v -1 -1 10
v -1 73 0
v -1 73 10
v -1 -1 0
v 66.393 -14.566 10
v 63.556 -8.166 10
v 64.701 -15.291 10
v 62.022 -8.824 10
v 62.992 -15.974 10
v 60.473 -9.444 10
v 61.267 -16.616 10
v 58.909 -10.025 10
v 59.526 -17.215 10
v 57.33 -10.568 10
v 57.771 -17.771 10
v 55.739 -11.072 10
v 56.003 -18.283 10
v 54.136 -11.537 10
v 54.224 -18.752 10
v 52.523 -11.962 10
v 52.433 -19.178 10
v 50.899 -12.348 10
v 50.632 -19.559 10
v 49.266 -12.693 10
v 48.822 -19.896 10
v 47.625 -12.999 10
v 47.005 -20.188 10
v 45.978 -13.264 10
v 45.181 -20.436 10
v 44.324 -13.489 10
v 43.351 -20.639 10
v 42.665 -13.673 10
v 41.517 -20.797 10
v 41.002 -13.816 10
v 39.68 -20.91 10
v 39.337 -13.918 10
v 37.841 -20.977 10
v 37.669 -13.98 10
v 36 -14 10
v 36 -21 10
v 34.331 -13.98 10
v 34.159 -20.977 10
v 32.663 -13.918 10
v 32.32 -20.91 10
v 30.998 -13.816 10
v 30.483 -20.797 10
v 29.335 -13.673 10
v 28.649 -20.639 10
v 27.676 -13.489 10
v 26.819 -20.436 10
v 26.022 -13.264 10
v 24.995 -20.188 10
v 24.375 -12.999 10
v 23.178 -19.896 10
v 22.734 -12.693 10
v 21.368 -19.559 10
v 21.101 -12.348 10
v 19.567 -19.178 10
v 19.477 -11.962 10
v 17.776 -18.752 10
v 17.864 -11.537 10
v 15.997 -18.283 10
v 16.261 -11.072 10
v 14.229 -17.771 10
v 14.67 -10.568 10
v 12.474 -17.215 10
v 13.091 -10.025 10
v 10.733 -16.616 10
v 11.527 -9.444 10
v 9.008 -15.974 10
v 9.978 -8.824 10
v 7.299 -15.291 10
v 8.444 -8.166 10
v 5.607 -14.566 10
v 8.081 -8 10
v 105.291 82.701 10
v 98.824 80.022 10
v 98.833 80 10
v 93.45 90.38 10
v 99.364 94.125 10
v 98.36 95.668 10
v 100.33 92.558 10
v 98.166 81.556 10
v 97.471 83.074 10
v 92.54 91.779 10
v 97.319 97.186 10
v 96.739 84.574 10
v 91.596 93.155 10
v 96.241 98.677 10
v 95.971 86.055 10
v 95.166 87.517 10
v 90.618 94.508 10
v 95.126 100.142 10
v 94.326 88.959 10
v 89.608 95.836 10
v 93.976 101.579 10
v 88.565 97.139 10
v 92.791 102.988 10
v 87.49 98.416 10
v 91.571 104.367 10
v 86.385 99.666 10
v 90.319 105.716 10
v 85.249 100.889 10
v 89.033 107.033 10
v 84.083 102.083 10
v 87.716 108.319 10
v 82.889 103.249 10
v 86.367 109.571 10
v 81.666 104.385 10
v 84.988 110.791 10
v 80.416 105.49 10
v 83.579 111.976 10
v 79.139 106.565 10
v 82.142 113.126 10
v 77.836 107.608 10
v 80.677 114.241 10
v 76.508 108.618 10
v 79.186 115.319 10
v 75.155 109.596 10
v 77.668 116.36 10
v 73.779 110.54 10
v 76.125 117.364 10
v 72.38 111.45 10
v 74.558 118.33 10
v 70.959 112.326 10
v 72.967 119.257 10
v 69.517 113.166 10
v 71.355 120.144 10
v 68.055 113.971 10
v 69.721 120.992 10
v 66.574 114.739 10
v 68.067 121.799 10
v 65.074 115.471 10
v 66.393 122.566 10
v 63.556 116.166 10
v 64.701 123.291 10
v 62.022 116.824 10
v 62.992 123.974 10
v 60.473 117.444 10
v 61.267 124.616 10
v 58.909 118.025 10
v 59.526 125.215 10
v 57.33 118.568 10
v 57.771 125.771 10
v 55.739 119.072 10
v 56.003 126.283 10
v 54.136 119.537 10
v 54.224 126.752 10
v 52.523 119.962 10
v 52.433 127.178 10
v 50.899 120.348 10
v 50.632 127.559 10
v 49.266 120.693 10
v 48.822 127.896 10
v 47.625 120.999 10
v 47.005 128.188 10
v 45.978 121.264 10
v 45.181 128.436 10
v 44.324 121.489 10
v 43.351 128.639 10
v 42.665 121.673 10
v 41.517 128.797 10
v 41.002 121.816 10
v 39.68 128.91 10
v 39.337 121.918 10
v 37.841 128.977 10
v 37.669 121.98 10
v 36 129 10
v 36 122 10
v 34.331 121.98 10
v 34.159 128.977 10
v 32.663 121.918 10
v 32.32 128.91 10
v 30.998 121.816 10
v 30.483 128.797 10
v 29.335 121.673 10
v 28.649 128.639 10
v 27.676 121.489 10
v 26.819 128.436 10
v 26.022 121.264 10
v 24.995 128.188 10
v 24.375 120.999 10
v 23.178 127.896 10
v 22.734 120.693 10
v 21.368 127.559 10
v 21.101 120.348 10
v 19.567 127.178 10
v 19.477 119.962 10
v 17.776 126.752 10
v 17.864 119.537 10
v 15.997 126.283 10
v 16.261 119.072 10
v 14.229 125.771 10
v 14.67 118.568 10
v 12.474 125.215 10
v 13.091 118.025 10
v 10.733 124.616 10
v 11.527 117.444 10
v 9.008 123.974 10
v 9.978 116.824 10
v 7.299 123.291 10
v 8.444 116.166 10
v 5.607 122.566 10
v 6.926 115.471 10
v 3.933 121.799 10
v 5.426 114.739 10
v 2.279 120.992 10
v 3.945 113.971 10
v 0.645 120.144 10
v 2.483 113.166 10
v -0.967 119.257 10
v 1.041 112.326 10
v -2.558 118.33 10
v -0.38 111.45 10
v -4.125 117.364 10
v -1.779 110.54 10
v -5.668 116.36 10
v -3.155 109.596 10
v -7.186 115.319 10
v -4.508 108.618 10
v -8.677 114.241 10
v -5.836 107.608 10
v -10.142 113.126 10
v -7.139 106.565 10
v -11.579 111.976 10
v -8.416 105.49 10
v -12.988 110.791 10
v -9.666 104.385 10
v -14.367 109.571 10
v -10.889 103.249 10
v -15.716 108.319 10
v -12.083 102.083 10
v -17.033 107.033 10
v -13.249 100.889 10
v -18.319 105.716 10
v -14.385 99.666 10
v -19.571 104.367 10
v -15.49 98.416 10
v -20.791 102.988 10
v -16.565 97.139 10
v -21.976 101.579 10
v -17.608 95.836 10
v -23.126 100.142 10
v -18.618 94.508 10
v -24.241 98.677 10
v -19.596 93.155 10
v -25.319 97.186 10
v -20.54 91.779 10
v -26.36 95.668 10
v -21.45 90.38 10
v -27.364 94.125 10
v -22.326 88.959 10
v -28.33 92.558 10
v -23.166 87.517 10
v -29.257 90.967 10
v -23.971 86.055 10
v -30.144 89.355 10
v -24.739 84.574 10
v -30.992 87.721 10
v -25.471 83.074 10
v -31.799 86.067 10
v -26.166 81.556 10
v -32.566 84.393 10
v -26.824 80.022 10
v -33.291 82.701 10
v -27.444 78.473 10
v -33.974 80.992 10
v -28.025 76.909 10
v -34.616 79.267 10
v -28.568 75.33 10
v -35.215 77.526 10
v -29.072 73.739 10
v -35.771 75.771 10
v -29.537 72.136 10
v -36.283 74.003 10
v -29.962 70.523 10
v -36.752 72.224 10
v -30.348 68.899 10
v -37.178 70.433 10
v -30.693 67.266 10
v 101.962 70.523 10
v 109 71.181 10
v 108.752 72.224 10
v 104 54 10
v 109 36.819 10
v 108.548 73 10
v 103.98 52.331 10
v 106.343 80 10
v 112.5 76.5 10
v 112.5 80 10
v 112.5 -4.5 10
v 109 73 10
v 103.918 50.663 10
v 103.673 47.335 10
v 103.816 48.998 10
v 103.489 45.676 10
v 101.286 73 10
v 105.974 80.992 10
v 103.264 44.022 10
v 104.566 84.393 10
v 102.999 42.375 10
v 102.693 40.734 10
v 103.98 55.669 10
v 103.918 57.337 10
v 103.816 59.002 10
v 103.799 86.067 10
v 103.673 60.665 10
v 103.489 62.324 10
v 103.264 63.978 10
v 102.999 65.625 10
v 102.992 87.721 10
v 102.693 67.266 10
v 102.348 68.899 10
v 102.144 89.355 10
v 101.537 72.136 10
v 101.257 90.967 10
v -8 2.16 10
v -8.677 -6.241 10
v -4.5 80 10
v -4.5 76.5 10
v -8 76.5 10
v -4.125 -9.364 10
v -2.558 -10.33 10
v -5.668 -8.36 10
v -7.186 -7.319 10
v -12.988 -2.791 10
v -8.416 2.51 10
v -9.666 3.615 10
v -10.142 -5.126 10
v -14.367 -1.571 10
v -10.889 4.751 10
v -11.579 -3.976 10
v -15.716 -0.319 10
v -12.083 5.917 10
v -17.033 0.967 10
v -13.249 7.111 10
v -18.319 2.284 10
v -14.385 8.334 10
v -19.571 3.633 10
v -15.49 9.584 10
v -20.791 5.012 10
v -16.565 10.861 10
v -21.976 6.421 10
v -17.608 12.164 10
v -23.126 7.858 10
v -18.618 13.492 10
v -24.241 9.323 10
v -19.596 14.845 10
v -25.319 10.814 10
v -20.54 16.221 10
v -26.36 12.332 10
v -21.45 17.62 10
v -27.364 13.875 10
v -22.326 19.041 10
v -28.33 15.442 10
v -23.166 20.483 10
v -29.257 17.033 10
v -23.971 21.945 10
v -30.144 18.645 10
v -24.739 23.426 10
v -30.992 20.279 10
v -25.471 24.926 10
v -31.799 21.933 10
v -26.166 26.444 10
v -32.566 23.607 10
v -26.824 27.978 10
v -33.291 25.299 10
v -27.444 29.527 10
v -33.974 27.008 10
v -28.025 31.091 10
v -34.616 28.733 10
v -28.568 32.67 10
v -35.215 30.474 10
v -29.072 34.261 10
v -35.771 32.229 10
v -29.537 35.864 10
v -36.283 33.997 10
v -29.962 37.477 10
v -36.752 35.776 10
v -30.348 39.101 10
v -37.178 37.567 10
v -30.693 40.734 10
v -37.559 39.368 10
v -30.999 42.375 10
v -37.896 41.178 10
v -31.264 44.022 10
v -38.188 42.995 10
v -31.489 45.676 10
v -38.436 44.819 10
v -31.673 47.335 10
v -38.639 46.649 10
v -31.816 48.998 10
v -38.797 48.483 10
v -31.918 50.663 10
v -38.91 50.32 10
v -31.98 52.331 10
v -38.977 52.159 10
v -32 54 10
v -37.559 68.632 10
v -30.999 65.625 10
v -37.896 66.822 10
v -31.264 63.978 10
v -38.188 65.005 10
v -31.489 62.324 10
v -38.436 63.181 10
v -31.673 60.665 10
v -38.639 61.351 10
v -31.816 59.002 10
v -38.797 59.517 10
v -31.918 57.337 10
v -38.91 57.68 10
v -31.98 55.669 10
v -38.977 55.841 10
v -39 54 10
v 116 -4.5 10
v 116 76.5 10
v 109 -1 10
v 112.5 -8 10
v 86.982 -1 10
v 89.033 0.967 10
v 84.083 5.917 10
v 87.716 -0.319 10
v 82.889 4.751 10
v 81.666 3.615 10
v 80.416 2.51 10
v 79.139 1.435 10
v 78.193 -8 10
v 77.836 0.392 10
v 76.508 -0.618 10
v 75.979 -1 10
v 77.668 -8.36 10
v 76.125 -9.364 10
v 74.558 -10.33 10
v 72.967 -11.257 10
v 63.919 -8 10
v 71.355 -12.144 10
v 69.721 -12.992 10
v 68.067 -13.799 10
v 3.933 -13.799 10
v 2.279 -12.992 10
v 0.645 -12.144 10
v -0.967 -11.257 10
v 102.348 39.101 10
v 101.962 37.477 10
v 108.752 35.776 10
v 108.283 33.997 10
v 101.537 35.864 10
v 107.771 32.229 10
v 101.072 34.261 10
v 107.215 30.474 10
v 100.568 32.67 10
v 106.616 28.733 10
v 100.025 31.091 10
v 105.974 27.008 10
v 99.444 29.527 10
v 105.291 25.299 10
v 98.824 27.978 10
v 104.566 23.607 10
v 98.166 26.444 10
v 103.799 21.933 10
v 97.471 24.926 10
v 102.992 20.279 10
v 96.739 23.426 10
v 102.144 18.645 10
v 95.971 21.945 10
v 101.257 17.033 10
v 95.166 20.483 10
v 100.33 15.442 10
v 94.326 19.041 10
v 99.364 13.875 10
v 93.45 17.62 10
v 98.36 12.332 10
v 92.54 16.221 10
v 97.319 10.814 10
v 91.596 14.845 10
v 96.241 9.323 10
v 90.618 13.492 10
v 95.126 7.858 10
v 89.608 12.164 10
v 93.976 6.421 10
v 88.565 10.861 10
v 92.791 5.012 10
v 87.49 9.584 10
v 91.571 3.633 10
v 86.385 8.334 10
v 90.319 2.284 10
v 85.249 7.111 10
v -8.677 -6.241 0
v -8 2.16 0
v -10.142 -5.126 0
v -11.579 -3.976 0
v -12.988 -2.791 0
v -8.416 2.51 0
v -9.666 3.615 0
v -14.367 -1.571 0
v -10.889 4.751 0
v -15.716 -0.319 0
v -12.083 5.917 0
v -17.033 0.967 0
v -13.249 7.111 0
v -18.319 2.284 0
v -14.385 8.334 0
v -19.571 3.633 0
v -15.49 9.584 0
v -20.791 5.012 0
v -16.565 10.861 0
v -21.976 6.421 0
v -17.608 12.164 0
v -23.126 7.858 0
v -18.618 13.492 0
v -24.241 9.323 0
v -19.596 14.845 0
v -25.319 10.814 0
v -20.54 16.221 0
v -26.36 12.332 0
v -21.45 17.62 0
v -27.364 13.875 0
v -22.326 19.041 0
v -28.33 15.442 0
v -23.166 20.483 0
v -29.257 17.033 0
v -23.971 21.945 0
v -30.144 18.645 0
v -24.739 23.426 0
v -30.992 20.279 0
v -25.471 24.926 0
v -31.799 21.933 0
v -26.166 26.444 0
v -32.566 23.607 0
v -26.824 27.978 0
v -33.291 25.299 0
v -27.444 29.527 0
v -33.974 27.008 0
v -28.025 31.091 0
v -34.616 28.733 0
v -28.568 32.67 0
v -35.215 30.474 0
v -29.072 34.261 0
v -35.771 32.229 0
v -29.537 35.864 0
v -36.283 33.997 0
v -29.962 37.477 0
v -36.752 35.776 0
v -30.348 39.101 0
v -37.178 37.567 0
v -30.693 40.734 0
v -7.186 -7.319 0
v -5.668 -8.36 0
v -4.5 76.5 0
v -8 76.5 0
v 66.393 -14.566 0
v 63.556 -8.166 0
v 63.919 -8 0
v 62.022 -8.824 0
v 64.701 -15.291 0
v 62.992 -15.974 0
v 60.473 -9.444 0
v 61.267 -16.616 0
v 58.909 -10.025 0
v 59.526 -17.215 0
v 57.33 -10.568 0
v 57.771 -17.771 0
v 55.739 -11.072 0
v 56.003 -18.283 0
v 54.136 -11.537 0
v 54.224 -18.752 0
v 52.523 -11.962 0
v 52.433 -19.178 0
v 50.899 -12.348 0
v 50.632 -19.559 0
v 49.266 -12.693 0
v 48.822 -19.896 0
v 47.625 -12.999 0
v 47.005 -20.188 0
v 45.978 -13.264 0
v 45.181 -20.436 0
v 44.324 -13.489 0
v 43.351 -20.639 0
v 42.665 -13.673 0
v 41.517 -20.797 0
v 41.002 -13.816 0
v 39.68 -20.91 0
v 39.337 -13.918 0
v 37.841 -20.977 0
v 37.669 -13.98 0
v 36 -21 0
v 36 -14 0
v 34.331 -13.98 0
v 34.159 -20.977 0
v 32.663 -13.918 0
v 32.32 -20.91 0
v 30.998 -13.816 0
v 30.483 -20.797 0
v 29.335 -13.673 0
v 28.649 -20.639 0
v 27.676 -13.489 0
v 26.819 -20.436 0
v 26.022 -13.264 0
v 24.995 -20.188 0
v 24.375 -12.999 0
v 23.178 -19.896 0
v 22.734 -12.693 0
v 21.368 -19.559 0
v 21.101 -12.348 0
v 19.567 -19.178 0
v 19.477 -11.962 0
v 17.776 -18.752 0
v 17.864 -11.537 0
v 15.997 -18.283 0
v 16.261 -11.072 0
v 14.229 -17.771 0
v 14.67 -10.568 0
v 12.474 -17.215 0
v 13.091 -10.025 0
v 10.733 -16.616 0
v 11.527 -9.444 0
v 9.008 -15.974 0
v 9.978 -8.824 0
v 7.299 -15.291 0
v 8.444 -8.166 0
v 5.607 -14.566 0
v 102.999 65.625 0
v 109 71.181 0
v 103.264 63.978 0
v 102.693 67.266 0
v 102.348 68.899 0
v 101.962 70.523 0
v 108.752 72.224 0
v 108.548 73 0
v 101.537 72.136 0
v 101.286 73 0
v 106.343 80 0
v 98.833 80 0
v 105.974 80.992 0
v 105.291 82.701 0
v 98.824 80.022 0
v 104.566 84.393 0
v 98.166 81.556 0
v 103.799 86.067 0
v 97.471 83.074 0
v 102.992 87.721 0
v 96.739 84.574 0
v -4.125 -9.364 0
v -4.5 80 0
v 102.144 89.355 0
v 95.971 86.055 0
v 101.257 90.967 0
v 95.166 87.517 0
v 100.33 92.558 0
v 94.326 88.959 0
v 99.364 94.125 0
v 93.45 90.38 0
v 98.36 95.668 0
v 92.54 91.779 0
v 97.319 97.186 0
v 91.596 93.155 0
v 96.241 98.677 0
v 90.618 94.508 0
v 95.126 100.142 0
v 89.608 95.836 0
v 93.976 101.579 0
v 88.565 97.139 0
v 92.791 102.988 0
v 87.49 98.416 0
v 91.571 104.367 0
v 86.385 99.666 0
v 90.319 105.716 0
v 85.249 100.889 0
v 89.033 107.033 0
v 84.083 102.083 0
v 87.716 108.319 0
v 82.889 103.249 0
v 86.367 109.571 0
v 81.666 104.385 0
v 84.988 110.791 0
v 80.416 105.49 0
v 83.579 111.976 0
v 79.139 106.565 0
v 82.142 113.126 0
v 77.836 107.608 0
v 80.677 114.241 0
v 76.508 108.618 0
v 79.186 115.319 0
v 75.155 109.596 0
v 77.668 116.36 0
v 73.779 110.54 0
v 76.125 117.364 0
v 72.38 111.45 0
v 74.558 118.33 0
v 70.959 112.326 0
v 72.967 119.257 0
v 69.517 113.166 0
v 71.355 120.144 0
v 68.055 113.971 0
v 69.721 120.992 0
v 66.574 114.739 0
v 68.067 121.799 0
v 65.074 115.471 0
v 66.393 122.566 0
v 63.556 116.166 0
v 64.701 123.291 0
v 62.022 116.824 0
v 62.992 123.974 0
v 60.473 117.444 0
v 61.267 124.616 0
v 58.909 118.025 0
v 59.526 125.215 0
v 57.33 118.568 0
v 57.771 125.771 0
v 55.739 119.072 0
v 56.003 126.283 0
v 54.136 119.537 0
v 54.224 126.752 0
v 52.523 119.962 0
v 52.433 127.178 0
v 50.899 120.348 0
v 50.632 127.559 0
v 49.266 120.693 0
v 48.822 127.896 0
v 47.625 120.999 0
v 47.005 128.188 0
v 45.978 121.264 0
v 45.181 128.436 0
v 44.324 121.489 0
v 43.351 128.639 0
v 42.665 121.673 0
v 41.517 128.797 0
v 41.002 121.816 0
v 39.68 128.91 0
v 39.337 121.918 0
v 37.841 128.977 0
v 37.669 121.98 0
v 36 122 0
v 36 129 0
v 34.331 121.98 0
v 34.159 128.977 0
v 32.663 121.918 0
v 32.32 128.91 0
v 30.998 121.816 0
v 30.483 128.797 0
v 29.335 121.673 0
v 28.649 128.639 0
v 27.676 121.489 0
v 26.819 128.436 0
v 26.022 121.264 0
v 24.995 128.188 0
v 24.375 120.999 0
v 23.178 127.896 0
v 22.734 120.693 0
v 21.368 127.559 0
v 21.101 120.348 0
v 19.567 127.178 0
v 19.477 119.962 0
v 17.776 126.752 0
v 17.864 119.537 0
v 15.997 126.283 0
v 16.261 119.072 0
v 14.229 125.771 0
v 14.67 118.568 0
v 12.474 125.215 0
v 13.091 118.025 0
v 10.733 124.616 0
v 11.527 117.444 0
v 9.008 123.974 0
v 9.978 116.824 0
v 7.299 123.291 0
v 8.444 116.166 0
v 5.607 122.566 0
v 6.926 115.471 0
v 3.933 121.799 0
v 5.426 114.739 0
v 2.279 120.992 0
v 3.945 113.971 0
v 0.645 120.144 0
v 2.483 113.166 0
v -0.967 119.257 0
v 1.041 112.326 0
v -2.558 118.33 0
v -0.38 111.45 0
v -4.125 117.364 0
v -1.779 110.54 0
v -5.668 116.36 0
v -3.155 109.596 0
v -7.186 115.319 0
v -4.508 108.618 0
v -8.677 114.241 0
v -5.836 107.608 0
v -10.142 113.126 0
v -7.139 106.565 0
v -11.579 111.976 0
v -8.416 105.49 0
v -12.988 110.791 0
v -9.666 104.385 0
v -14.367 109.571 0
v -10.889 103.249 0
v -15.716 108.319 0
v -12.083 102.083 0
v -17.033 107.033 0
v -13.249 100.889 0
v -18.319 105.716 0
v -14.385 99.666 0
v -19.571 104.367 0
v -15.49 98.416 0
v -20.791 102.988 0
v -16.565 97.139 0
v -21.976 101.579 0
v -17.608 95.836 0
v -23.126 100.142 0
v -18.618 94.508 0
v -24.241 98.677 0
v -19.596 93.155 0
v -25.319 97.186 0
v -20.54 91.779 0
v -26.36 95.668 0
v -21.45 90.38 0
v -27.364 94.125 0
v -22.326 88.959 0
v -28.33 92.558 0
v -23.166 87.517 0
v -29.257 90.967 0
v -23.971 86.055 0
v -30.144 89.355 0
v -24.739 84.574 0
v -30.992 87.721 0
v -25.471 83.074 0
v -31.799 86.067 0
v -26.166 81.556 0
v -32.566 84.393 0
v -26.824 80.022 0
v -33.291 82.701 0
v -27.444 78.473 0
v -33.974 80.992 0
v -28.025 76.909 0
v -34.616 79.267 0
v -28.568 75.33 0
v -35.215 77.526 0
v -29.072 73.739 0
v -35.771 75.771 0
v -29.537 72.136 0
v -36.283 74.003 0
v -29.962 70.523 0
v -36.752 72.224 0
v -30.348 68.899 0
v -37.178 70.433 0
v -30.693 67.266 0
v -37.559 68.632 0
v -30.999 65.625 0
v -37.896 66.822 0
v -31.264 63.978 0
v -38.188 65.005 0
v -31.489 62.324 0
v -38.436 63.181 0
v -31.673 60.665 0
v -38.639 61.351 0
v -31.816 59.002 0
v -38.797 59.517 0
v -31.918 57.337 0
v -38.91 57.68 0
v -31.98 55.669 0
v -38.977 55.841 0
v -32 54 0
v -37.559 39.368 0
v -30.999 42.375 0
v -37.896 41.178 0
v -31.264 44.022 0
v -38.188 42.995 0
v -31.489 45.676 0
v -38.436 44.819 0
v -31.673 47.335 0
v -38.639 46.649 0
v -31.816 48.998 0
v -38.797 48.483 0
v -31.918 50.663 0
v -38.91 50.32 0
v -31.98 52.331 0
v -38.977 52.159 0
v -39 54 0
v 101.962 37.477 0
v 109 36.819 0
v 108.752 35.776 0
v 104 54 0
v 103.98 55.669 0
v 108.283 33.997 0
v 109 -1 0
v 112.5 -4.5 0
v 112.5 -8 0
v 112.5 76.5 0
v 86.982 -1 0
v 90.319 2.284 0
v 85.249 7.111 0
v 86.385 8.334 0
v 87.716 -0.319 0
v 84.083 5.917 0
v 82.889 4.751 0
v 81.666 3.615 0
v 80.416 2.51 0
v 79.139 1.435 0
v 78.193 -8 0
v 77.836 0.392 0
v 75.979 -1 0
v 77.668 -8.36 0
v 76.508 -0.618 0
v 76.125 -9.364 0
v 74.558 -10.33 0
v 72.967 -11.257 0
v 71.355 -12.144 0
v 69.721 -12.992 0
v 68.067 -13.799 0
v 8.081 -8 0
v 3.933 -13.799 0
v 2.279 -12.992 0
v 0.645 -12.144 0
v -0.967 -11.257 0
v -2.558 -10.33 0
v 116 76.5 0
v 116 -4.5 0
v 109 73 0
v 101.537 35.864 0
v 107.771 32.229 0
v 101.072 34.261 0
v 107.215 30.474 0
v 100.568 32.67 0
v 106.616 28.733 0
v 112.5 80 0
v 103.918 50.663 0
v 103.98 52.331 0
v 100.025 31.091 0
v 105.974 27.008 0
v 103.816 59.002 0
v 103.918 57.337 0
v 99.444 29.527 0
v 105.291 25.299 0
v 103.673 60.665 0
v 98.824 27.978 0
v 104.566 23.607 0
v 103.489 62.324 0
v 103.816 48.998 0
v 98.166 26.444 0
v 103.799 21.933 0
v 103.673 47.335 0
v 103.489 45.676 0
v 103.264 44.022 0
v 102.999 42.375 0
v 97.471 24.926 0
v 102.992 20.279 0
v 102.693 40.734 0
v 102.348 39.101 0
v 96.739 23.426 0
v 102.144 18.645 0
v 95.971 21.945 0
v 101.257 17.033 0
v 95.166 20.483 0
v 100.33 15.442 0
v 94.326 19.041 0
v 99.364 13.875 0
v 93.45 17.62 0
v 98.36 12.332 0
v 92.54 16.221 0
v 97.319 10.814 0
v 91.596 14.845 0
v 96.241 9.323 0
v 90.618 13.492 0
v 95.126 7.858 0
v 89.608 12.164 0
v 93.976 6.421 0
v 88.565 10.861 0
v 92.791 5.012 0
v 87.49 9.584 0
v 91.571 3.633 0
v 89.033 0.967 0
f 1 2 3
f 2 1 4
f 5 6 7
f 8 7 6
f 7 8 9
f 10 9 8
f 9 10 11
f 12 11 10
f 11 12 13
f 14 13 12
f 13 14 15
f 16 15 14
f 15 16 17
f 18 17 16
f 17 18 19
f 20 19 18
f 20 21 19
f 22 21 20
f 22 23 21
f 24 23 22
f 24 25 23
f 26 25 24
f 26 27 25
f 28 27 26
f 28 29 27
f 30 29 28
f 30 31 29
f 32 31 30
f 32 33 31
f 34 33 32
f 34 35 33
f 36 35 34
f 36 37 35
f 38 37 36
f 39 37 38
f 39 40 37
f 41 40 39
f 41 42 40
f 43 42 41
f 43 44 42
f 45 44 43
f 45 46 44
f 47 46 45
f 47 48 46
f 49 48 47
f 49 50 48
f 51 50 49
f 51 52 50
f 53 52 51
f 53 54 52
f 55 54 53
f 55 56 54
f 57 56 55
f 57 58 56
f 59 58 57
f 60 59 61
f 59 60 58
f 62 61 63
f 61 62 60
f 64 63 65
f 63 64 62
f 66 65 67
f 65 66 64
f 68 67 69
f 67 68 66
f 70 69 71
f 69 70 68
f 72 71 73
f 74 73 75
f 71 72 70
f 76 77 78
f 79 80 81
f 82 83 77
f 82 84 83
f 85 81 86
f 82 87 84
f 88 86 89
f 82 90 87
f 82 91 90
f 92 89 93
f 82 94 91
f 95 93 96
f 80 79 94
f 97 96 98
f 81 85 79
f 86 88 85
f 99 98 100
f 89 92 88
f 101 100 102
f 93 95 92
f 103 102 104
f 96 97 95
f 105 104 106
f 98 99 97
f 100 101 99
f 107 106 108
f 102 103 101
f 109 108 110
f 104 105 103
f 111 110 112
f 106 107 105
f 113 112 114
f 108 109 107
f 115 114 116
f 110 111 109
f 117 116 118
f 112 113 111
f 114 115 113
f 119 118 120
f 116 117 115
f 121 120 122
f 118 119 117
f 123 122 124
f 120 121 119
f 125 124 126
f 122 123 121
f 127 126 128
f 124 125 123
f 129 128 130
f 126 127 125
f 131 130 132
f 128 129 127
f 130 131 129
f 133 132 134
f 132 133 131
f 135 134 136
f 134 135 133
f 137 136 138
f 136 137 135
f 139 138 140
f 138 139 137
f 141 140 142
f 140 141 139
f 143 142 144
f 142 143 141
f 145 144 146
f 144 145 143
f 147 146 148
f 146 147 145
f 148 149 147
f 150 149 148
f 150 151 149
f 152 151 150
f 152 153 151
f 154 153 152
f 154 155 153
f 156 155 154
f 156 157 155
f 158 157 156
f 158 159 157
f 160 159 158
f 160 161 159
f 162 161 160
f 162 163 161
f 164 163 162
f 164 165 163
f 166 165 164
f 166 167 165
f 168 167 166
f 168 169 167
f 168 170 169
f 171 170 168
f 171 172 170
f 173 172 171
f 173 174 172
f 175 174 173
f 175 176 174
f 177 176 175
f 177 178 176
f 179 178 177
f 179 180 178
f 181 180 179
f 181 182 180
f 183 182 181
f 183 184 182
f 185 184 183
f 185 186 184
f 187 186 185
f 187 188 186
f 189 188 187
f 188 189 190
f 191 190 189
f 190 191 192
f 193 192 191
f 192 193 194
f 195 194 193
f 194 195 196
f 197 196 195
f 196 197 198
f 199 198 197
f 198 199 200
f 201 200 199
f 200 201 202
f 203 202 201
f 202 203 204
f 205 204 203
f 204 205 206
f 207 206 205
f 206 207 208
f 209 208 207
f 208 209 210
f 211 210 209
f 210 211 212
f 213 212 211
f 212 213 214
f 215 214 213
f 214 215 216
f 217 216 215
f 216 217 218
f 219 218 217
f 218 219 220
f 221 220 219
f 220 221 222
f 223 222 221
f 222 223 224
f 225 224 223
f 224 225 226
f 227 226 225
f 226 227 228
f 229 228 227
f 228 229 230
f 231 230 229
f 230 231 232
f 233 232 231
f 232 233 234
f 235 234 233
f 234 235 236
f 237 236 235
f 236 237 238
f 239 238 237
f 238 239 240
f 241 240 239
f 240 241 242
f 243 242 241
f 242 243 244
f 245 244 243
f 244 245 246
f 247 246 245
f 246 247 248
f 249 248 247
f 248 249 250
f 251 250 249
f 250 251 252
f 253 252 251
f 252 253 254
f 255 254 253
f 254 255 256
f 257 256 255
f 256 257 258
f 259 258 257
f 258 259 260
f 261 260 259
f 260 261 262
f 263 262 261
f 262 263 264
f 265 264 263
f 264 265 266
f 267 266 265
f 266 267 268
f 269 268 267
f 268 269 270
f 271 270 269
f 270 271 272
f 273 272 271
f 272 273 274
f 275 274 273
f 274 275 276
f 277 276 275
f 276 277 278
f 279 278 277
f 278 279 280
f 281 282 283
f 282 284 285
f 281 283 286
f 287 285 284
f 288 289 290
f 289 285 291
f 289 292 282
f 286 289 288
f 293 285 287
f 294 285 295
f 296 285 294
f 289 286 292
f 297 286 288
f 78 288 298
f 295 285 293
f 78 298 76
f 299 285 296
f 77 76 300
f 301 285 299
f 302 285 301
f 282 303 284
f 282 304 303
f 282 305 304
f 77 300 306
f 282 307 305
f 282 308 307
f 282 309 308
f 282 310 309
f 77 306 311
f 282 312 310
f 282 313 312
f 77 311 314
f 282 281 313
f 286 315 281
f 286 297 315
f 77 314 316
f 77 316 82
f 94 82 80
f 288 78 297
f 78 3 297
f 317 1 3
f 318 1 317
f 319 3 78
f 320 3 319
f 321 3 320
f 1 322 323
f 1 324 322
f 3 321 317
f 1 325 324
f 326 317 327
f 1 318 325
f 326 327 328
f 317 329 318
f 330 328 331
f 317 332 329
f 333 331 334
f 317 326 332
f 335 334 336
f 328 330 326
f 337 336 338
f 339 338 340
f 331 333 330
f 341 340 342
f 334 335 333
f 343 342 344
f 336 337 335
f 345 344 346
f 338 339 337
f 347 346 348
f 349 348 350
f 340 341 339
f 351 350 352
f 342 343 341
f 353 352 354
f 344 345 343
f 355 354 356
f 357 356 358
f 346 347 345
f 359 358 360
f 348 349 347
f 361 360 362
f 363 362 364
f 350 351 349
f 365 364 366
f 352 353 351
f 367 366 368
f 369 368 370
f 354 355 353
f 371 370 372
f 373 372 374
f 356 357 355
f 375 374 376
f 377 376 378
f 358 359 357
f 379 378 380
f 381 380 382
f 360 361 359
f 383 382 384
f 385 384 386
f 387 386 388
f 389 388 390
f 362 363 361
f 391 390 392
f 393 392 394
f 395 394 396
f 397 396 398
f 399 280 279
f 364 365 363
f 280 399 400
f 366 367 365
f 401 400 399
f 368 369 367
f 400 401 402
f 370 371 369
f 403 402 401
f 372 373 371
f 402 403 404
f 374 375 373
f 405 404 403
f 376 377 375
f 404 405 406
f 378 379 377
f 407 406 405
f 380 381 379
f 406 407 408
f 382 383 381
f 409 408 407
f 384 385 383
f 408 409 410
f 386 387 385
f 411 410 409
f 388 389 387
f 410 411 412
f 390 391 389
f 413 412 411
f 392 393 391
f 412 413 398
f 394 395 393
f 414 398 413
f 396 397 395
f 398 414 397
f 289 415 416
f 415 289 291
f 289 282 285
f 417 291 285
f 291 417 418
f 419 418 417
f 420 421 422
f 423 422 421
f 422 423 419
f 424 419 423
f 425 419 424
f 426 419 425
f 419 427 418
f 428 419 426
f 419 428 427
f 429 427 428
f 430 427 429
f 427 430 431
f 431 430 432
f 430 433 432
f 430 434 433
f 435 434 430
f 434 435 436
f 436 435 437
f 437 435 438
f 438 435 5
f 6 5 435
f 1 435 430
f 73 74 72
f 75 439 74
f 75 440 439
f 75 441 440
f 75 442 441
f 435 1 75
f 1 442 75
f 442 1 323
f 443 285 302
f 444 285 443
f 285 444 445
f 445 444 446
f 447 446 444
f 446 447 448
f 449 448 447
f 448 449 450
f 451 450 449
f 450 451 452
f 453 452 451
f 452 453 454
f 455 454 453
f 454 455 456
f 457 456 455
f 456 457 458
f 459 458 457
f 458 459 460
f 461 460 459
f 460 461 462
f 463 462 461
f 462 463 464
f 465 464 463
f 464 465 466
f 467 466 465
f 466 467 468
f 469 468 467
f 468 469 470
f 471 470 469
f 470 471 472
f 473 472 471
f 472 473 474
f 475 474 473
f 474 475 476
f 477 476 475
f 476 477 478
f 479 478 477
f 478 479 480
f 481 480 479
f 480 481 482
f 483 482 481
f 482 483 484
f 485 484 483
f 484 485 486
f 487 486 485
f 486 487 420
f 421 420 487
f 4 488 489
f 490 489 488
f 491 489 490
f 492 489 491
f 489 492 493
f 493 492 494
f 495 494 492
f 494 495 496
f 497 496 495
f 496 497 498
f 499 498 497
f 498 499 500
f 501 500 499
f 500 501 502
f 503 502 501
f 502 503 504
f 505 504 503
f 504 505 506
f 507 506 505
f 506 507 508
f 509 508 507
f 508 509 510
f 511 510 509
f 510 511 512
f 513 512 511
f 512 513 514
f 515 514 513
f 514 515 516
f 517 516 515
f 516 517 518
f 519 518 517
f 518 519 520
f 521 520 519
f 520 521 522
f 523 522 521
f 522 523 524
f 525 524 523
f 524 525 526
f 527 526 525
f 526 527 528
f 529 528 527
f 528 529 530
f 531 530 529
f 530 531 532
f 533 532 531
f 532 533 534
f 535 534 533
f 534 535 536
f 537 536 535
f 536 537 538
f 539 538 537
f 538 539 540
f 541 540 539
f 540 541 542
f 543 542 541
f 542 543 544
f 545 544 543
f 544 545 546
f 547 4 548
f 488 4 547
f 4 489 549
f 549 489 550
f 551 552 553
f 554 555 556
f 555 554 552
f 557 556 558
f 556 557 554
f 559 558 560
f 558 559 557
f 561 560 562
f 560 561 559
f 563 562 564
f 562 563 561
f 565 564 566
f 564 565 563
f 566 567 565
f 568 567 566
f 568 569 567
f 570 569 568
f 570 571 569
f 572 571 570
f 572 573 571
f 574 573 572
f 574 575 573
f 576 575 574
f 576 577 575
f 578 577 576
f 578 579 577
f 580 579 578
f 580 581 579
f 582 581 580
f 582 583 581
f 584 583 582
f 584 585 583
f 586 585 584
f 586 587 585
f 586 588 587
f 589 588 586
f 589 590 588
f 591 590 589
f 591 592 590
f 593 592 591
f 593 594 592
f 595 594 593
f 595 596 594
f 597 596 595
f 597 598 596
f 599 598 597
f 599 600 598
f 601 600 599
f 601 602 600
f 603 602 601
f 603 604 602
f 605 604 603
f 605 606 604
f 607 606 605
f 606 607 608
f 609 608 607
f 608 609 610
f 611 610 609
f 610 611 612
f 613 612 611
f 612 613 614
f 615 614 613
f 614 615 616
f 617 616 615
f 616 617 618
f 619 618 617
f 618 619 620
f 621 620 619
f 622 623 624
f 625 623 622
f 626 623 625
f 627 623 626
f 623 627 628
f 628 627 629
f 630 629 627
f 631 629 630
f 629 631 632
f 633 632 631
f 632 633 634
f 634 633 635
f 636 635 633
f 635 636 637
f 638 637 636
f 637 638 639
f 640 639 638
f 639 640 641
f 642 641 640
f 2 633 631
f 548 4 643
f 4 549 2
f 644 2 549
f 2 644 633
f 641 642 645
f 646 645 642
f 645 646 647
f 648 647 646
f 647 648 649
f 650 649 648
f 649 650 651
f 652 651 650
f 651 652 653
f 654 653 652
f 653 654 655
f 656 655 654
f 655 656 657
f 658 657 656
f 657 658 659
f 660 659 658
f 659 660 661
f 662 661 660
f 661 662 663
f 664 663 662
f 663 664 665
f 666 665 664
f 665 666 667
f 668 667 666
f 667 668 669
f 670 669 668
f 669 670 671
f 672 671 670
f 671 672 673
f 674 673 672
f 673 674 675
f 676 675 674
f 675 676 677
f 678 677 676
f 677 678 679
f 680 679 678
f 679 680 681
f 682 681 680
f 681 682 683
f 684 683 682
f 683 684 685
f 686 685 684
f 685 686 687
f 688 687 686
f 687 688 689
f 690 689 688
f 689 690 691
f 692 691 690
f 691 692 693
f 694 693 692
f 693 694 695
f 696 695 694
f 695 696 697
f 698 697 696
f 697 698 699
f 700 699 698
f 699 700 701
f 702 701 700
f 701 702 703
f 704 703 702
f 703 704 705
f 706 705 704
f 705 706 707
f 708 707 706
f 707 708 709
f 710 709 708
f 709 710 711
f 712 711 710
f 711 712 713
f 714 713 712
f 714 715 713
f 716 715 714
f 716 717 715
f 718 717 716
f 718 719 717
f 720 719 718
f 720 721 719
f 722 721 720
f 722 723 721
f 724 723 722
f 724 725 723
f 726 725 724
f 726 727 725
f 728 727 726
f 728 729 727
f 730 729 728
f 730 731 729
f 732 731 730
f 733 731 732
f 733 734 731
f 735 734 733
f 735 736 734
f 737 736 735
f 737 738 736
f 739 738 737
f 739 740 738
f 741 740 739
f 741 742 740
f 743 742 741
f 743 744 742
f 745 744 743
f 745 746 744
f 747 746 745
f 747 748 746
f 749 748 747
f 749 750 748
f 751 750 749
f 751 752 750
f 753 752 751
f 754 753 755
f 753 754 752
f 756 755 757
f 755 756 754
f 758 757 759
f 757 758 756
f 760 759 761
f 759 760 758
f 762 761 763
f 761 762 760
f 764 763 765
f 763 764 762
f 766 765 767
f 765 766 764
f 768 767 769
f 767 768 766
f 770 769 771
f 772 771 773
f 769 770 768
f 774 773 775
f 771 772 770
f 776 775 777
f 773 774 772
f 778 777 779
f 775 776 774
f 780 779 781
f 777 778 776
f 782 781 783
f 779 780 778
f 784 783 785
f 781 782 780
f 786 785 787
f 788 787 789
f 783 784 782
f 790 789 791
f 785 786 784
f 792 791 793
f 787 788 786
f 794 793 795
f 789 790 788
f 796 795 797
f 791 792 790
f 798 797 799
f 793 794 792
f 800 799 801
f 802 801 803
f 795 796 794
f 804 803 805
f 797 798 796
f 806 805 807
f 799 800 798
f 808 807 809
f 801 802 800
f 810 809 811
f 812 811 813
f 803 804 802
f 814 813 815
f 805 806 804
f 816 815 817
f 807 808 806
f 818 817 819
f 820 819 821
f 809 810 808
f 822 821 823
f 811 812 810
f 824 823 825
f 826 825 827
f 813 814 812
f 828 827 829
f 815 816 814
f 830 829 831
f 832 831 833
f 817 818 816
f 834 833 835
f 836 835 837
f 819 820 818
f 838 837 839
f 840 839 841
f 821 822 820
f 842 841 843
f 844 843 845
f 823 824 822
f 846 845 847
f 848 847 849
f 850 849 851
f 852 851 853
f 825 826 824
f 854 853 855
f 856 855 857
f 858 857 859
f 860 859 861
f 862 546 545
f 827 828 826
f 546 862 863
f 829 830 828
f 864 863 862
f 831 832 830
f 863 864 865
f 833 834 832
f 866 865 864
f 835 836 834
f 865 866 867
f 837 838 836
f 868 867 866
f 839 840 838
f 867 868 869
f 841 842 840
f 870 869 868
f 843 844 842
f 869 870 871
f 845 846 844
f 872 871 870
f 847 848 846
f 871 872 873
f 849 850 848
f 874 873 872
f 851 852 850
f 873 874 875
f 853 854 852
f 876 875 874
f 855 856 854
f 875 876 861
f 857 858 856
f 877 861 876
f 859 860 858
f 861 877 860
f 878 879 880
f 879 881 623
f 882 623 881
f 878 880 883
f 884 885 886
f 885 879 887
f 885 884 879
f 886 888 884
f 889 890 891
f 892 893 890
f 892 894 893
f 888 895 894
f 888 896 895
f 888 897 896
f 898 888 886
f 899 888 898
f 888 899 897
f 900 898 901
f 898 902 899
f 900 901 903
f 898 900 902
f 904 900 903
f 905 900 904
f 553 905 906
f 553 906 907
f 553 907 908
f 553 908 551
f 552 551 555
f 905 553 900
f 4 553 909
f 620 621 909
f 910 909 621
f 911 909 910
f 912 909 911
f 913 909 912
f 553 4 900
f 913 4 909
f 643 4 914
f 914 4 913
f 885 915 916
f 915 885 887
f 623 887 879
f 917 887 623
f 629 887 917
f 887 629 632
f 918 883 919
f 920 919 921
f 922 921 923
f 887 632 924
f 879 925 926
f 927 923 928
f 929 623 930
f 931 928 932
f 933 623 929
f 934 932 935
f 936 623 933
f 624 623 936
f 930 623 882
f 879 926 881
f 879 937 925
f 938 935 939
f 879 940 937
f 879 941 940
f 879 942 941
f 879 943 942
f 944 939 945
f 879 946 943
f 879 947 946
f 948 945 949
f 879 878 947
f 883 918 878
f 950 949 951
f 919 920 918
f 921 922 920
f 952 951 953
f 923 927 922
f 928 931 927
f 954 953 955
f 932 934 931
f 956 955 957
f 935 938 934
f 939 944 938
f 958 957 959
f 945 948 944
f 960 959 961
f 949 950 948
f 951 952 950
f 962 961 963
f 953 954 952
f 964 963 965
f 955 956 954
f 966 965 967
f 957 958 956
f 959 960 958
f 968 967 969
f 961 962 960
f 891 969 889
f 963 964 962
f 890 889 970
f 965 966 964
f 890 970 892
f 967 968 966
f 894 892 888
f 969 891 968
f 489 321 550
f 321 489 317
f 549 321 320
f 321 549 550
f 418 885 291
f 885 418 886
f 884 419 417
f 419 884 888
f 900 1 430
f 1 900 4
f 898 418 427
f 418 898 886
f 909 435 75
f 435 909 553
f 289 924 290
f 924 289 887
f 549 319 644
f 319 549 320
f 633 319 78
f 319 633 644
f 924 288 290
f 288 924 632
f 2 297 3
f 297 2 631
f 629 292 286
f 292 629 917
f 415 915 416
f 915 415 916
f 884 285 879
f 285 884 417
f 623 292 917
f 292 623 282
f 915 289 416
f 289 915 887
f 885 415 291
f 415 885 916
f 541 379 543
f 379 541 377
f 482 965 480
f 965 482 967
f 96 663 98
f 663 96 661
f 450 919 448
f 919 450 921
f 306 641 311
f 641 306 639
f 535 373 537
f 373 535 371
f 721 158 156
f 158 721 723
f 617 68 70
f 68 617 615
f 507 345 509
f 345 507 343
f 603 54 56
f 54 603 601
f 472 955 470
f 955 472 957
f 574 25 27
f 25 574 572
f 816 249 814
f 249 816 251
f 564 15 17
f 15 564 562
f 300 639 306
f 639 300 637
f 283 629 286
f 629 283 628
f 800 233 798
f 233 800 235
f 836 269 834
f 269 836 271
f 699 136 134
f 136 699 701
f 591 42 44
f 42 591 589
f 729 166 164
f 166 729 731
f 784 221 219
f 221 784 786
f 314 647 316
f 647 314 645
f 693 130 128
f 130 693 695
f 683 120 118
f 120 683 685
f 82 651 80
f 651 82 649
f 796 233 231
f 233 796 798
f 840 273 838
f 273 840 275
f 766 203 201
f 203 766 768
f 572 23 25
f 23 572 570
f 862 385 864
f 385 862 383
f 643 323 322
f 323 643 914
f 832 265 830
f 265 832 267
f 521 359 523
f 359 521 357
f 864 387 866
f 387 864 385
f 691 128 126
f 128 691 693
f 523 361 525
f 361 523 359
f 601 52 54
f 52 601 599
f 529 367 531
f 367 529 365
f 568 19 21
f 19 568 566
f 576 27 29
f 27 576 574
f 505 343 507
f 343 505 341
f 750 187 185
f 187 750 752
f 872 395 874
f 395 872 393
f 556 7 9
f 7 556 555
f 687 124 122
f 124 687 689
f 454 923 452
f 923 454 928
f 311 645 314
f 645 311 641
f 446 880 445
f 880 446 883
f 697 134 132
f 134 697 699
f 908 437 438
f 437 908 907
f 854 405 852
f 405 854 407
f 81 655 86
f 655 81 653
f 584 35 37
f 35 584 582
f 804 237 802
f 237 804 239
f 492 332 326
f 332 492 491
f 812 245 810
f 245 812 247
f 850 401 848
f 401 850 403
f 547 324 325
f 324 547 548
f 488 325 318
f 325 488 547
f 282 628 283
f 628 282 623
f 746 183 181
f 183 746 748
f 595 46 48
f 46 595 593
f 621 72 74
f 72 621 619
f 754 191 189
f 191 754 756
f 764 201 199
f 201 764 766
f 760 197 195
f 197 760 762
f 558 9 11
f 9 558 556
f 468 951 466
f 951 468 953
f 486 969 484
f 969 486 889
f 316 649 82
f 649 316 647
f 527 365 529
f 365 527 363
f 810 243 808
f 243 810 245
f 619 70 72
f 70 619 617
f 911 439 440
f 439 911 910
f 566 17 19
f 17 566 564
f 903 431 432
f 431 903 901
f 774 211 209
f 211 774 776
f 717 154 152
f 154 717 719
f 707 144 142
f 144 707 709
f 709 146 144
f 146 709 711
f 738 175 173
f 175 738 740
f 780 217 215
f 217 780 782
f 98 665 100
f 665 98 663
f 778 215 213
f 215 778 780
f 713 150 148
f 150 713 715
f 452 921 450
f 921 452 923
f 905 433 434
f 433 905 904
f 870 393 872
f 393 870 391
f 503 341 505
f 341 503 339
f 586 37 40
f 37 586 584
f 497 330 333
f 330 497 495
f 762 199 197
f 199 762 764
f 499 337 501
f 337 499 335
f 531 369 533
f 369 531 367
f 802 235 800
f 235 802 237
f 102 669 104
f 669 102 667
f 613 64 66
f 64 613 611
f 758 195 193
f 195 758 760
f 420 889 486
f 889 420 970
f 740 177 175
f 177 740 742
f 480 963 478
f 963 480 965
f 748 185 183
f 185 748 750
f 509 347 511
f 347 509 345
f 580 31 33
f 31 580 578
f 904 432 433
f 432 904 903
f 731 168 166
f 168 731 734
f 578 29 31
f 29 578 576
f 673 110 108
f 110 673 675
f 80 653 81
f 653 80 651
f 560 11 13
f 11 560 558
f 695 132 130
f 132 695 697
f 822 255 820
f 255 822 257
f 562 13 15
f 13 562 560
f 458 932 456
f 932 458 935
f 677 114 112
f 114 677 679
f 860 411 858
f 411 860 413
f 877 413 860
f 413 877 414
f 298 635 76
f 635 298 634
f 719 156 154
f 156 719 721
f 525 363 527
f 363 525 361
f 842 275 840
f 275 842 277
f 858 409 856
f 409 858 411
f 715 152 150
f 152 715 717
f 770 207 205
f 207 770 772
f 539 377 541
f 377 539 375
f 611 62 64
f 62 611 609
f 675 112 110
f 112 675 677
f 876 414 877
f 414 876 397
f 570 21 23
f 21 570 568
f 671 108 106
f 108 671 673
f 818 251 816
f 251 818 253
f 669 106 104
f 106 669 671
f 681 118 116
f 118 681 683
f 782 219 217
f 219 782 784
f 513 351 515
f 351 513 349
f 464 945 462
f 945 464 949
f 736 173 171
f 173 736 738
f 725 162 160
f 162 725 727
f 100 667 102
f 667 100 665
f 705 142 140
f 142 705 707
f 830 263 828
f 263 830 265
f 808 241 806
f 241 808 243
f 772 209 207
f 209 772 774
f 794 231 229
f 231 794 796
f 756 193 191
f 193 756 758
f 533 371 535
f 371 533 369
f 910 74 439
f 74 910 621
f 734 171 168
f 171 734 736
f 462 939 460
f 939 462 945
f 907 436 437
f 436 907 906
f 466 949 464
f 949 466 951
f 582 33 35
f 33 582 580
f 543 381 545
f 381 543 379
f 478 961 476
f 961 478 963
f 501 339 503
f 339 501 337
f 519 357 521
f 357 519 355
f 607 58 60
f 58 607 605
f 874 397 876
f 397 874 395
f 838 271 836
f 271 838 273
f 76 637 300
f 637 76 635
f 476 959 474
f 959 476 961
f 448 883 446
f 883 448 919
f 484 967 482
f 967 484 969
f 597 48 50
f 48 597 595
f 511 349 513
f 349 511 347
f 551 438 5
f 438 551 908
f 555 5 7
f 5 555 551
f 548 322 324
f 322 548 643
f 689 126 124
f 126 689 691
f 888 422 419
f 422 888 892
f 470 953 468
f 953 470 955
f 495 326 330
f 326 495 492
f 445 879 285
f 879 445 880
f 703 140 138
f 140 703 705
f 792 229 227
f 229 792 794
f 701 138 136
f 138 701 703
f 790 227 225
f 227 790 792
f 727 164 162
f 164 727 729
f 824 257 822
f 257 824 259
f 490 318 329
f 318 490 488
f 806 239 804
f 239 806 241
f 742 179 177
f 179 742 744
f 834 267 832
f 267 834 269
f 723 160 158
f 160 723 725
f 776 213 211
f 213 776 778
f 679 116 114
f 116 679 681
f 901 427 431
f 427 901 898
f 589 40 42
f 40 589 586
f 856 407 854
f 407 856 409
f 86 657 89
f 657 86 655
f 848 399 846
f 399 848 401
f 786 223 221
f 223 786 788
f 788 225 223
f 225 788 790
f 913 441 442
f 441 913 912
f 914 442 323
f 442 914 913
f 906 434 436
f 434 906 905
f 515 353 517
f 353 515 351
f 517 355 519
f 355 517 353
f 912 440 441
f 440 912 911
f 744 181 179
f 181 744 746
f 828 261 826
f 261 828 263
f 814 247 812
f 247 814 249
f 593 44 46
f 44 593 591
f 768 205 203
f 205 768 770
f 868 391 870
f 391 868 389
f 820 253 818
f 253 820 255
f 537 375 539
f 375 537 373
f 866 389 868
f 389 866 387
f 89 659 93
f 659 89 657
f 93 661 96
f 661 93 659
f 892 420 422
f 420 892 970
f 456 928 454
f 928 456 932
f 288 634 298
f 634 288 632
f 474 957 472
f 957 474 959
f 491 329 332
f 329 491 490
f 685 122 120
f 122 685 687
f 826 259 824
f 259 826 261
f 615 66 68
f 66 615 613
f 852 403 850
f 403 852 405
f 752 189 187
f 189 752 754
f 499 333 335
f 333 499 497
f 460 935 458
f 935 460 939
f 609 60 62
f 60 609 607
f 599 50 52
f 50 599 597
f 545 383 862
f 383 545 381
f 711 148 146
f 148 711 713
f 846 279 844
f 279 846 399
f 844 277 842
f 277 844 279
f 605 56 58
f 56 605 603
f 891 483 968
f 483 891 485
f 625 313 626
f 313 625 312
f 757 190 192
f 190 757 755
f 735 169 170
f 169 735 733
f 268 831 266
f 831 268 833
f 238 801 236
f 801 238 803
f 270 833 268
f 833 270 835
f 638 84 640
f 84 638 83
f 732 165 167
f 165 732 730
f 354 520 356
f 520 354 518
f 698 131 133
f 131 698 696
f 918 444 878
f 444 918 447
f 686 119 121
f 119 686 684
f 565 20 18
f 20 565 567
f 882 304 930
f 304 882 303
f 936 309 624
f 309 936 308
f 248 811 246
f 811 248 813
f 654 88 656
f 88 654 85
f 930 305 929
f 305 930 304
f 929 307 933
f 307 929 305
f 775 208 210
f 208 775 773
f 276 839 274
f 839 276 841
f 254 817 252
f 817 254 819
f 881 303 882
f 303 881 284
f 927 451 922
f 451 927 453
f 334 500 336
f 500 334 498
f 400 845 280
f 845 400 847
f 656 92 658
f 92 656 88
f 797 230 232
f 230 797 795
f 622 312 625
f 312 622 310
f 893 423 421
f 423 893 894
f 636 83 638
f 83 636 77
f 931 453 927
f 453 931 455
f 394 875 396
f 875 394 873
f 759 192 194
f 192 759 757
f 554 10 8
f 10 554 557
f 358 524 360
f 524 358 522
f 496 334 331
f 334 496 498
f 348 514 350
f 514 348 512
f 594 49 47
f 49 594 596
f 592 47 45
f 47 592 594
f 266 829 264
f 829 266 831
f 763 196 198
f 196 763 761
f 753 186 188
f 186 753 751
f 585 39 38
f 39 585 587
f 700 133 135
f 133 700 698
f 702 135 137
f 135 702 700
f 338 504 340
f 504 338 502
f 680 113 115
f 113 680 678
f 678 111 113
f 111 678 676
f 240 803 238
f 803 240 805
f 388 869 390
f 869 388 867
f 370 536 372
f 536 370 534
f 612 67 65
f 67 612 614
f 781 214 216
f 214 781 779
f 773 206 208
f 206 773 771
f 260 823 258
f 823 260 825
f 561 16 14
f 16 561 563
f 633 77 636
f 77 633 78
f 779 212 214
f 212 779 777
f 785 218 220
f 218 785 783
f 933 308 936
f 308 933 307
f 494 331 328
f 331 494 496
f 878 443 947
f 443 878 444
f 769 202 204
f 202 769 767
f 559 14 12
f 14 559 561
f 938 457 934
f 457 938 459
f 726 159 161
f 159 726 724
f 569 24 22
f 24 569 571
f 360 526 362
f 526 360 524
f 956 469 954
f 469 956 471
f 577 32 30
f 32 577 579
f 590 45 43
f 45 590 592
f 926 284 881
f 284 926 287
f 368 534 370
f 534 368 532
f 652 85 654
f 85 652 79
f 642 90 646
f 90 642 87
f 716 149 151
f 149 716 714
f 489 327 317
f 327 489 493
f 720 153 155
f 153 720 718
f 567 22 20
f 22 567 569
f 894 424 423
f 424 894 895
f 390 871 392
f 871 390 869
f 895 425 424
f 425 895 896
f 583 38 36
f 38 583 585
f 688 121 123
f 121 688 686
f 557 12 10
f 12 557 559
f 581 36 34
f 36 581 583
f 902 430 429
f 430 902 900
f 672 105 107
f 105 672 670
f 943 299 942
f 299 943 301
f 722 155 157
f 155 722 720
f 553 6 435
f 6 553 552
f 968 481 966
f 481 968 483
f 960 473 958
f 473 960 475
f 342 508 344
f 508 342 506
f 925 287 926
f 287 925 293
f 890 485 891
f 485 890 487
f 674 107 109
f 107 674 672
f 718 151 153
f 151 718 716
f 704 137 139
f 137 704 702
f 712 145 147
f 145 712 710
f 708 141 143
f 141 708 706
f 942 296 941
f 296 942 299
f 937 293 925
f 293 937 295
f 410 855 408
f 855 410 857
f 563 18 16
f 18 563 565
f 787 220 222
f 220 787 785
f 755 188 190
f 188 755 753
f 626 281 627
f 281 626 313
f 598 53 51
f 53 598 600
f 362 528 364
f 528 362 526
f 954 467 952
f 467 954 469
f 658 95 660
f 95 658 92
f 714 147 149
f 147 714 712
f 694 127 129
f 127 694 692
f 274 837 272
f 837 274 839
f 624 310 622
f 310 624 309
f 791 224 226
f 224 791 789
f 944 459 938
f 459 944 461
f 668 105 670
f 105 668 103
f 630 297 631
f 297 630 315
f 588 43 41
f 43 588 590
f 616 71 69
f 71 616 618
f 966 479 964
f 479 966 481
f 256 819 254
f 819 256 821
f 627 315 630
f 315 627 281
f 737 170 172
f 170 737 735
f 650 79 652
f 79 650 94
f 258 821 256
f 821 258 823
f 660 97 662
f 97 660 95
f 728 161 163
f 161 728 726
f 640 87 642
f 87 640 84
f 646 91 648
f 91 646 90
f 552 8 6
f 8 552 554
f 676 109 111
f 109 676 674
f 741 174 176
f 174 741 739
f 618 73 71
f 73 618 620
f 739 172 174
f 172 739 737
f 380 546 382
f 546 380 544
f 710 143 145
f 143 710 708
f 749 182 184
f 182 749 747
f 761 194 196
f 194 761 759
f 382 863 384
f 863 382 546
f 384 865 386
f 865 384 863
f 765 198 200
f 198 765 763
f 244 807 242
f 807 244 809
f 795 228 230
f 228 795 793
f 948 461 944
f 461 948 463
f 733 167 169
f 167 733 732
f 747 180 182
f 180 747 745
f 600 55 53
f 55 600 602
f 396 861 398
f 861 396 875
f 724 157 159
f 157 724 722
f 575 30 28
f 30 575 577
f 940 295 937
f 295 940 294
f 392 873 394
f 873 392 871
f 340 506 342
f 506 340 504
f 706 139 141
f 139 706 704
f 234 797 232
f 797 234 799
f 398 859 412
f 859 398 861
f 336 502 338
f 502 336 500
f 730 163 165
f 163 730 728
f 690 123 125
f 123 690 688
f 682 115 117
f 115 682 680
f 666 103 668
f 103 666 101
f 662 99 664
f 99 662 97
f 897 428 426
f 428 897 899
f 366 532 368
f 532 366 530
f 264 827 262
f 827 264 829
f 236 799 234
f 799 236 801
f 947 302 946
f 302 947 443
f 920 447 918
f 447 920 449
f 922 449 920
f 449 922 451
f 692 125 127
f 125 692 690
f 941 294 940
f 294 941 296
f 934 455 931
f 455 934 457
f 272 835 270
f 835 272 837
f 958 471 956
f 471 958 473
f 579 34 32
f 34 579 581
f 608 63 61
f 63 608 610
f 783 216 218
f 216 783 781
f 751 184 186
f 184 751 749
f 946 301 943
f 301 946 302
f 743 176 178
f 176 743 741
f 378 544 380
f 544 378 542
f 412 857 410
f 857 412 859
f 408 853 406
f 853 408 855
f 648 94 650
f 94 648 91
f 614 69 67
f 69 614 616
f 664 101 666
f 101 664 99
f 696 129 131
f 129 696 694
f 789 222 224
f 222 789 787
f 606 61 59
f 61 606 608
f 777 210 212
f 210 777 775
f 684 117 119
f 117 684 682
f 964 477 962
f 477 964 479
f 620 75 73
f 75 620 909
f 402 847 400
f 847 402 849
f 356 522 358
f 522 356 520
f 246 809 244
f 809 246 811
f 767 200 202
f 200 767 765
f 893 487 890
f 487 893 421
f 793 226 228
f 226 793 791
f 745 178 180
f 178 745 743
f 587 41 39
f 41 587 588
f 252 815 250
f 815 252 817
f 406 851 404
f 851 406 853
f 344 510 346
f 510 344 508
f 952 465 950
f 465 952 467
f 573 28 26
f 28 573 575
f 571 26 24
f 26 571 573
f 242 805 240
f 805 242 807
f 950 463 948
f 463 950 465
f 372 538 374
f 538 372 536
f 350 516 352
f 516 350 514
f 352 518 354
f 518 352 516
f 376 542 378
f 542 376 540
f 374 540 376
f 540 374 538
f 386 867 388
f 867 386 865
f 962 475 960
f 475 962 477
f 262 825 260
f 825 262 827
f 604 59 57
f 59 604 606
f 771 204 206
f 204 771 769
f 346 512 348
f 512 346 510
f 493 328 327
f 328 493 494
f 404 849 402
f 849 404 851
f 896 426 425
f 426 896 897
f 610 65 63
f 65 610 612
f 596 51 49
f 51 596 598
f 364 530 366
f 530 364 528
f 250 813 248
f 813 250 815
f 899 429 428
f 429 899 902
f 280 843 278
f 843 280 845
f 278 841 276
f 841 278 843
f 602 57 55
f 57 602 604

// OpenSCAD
// Generated by SolidPython 1.1.3 on 2026-06-23 12:54:22


union() {
	union() {
		translate(v = [-4.5000000000, 36.0000000000, 5.0000000000]) {
			cube(center = true, size = [7, 81, 10]);
		}
		translate(v = [54.0000000000, -4.5000000000, 5.0000000000]) {
			cube(center = true, size = [117, 7, 10]);
		}
		translate(v = [0, 81]) {
			translate(v = [54.0000000000, -4.5000000000, 5.0000000000]) {
				cube(center = true, size = [117, 7, 10]);
			}
		}
		translate(v = [117, 0]) {
			translate(v = [-4.5000000000, 36.0000000000, 5.0000000000]) {
				cube(center = true, size = [7, 81, 10]);
			}
		}
	}
	translate(v = [36.0000000000, 54.0000000000]) {
		difference() {
			cylinder($fn = 256, h = 10, r = 75.0000000000);
			cylinder($fn = 256, h = 10, r = 68.0000000000);
		}
	}
}
/***********************************************
*********      SolidPython code:      **********
************************************************

"""SCAD file export functions.

This module provides functions for exporting OpenSCAD geometries to .scad files.
"""

from typing import Dict, Optional
from pathlib import Path
import solid

from .config import ExportConfiguration, FileNamingConfig


def export_scad(
    geometry: solid.OpenSCADObject, output_path: Path, header: Optional[str] = None
) -> Path:
    """Export geometry to SCAD file.

    Parameters
    ----------
    geometry : solid.OpenSCADObject
        Geometry to export.
    output_path : Path
        Output file path.
    header : str, optional
        Header comment to add to SCAD file.

    Returns
    -------
    Path
        Path to created SCAD file.

    Raises
    ------
    IOError
        If file cannot be written.

    Examples
    --------
    >>> from pathlib import Path
    >>> import solid
    >>>
    >>> geometry = solid.cube([10, 10, 10])
    >>> output_path = Path('output/device.scad')
    >>> export_scad(geometry, output_path)
    """
    # Ensure parent directory exists
    output_path.parent.mkdir(parents=True, exist_ok=True)

    # Render to file
    try:
        solid.scad_render_to_file(geometry, str(output_path))
    except Exception as e:
        raise IOError(f"Failed to write SCAD file to {output_path}: {e}")

    _normalize_scad_file(output_path)

    # Add header if provided
    if header:
        _add_header_to_scad(output_path, header)
        _normalize_scad_file(output_path)

    return output_path


def _normalize_scad_file(scad_path: Path) -> None:
    """Strip trailing whitespace from generated SCAD text."""
    content = scad_path.read_text()
    normalized = "\n".join(line.rstrip() for line in content.splitlines()) + "\n"
    if normalized != content:
        scad_path.write_text(normalized)


def export_multiple_scad(
    geometries: Dict[str, solid.OpenSCADObject],
    config: ExportConfiguration,
    naming_config: Optional[FileNamingConfig] = None,
) -> Dict[str, Path]:
    """Export multiple geometries to SCAD files.

    Parameters
    ----------
    geometries : dict
        Dictionary mapping prefixes to geometries.
        Keys are used as filename prefixes.
    config : ExportConfiguration
        Export configuration.
    naming_config : FileNamingConfig, optional
        File naming configuration.

    Returns
    -------
    dict
        Dictionary mapping prefixes to output paths.

    Examples
    --------
    >>> geometries = {
    ...     'wells': wells_geometry,
    ...     'channels': channels_geometry,
    ...     'device': device_geometry
    ... }
    >>> config = ExportConfiguration(output_directory=Path('output'))
    >>> paths = export_multiple_scad(geometries, config)
    """
    output_paths = {}

    for prefix, geometry in geometries.items():
        # Create naming config for this geometry
        if naming_config:
            file_config = FileNamingConfig(
                prefix=prefix,
                version=naming_config.version,
                grid_size=naming_config.grid_size,
                suffix=naming_config.suffix,
            )
        else:
            file_config = FileNamingConfig(prefix=prefix)

        # Generate filename
        filename = file_config.generate_filename("scad")
        output_path = config.get_output_path(filename)

        # Export
        export_scad(geometry, output_path)
        output_paths[prefix] = output_path

    return output_paths


def _add_header_to_scad(scad_path: Path, header: str):
    """Add header comment to existing SCAD file.

    Parameters
    ----------
    scad_path : Path
        Path to SCAD file.
    header : str
        Header text to add.
    """
    # Read existing content
    with open(scad_path, "r") as f:
        content = f.read()

    # Prepend header
    header_comment = f"// {header}\n\n"
    with open(scad_path, "w") as f:
        f.write(header_comment + content)


def generate_scad_header(
    device_name: str, version: Optional[str] = None, description: Optional[str] = None
) -> str:
    """Generate SCAD file header comment.

    Parameters
    ----------
    device_name : str
        Device name.
    version : str, optional
        Version string.
    description : str, optional
        Device description.

    Returns
    -------
    str
        Header comment text.

    Examples
    --------
    >>> header = generate_scad_header(
    ...     'Two Compartment Device',
    ...     version='v1',
    ...     description='96-well format with microchannels'
    ... )
    """
    lines = []
    lines.append("=" * 60)
    lines.append(f"Device: {device_name}")

    if version:
        lines.append(f"Version: {version}")

    if description:
        lines.append(f"Description: {description}")

    lines.append("Generated by OpenMFD")
    lines.append("=" * 60)

    return "\n".join(lines)


def validate_scad_file(scad_path: Path) -> bool:
    """Validate that SCAD file exists and is readable.

    Parameters
    ----------
    scad_path : Path
        Path to SCAD file.

    Returns
    -------
    bool
        True if file is valid, False otherwise.
    """
    if not scad_path.exists():
        return False

    if not scad_path.is_file():
        return False

    # Try to read file
    try:
        with open(scad_path, "r") as f:
            content = f.read()
        return len(content) > 0
    except Exception:
        return False


************************************************/
